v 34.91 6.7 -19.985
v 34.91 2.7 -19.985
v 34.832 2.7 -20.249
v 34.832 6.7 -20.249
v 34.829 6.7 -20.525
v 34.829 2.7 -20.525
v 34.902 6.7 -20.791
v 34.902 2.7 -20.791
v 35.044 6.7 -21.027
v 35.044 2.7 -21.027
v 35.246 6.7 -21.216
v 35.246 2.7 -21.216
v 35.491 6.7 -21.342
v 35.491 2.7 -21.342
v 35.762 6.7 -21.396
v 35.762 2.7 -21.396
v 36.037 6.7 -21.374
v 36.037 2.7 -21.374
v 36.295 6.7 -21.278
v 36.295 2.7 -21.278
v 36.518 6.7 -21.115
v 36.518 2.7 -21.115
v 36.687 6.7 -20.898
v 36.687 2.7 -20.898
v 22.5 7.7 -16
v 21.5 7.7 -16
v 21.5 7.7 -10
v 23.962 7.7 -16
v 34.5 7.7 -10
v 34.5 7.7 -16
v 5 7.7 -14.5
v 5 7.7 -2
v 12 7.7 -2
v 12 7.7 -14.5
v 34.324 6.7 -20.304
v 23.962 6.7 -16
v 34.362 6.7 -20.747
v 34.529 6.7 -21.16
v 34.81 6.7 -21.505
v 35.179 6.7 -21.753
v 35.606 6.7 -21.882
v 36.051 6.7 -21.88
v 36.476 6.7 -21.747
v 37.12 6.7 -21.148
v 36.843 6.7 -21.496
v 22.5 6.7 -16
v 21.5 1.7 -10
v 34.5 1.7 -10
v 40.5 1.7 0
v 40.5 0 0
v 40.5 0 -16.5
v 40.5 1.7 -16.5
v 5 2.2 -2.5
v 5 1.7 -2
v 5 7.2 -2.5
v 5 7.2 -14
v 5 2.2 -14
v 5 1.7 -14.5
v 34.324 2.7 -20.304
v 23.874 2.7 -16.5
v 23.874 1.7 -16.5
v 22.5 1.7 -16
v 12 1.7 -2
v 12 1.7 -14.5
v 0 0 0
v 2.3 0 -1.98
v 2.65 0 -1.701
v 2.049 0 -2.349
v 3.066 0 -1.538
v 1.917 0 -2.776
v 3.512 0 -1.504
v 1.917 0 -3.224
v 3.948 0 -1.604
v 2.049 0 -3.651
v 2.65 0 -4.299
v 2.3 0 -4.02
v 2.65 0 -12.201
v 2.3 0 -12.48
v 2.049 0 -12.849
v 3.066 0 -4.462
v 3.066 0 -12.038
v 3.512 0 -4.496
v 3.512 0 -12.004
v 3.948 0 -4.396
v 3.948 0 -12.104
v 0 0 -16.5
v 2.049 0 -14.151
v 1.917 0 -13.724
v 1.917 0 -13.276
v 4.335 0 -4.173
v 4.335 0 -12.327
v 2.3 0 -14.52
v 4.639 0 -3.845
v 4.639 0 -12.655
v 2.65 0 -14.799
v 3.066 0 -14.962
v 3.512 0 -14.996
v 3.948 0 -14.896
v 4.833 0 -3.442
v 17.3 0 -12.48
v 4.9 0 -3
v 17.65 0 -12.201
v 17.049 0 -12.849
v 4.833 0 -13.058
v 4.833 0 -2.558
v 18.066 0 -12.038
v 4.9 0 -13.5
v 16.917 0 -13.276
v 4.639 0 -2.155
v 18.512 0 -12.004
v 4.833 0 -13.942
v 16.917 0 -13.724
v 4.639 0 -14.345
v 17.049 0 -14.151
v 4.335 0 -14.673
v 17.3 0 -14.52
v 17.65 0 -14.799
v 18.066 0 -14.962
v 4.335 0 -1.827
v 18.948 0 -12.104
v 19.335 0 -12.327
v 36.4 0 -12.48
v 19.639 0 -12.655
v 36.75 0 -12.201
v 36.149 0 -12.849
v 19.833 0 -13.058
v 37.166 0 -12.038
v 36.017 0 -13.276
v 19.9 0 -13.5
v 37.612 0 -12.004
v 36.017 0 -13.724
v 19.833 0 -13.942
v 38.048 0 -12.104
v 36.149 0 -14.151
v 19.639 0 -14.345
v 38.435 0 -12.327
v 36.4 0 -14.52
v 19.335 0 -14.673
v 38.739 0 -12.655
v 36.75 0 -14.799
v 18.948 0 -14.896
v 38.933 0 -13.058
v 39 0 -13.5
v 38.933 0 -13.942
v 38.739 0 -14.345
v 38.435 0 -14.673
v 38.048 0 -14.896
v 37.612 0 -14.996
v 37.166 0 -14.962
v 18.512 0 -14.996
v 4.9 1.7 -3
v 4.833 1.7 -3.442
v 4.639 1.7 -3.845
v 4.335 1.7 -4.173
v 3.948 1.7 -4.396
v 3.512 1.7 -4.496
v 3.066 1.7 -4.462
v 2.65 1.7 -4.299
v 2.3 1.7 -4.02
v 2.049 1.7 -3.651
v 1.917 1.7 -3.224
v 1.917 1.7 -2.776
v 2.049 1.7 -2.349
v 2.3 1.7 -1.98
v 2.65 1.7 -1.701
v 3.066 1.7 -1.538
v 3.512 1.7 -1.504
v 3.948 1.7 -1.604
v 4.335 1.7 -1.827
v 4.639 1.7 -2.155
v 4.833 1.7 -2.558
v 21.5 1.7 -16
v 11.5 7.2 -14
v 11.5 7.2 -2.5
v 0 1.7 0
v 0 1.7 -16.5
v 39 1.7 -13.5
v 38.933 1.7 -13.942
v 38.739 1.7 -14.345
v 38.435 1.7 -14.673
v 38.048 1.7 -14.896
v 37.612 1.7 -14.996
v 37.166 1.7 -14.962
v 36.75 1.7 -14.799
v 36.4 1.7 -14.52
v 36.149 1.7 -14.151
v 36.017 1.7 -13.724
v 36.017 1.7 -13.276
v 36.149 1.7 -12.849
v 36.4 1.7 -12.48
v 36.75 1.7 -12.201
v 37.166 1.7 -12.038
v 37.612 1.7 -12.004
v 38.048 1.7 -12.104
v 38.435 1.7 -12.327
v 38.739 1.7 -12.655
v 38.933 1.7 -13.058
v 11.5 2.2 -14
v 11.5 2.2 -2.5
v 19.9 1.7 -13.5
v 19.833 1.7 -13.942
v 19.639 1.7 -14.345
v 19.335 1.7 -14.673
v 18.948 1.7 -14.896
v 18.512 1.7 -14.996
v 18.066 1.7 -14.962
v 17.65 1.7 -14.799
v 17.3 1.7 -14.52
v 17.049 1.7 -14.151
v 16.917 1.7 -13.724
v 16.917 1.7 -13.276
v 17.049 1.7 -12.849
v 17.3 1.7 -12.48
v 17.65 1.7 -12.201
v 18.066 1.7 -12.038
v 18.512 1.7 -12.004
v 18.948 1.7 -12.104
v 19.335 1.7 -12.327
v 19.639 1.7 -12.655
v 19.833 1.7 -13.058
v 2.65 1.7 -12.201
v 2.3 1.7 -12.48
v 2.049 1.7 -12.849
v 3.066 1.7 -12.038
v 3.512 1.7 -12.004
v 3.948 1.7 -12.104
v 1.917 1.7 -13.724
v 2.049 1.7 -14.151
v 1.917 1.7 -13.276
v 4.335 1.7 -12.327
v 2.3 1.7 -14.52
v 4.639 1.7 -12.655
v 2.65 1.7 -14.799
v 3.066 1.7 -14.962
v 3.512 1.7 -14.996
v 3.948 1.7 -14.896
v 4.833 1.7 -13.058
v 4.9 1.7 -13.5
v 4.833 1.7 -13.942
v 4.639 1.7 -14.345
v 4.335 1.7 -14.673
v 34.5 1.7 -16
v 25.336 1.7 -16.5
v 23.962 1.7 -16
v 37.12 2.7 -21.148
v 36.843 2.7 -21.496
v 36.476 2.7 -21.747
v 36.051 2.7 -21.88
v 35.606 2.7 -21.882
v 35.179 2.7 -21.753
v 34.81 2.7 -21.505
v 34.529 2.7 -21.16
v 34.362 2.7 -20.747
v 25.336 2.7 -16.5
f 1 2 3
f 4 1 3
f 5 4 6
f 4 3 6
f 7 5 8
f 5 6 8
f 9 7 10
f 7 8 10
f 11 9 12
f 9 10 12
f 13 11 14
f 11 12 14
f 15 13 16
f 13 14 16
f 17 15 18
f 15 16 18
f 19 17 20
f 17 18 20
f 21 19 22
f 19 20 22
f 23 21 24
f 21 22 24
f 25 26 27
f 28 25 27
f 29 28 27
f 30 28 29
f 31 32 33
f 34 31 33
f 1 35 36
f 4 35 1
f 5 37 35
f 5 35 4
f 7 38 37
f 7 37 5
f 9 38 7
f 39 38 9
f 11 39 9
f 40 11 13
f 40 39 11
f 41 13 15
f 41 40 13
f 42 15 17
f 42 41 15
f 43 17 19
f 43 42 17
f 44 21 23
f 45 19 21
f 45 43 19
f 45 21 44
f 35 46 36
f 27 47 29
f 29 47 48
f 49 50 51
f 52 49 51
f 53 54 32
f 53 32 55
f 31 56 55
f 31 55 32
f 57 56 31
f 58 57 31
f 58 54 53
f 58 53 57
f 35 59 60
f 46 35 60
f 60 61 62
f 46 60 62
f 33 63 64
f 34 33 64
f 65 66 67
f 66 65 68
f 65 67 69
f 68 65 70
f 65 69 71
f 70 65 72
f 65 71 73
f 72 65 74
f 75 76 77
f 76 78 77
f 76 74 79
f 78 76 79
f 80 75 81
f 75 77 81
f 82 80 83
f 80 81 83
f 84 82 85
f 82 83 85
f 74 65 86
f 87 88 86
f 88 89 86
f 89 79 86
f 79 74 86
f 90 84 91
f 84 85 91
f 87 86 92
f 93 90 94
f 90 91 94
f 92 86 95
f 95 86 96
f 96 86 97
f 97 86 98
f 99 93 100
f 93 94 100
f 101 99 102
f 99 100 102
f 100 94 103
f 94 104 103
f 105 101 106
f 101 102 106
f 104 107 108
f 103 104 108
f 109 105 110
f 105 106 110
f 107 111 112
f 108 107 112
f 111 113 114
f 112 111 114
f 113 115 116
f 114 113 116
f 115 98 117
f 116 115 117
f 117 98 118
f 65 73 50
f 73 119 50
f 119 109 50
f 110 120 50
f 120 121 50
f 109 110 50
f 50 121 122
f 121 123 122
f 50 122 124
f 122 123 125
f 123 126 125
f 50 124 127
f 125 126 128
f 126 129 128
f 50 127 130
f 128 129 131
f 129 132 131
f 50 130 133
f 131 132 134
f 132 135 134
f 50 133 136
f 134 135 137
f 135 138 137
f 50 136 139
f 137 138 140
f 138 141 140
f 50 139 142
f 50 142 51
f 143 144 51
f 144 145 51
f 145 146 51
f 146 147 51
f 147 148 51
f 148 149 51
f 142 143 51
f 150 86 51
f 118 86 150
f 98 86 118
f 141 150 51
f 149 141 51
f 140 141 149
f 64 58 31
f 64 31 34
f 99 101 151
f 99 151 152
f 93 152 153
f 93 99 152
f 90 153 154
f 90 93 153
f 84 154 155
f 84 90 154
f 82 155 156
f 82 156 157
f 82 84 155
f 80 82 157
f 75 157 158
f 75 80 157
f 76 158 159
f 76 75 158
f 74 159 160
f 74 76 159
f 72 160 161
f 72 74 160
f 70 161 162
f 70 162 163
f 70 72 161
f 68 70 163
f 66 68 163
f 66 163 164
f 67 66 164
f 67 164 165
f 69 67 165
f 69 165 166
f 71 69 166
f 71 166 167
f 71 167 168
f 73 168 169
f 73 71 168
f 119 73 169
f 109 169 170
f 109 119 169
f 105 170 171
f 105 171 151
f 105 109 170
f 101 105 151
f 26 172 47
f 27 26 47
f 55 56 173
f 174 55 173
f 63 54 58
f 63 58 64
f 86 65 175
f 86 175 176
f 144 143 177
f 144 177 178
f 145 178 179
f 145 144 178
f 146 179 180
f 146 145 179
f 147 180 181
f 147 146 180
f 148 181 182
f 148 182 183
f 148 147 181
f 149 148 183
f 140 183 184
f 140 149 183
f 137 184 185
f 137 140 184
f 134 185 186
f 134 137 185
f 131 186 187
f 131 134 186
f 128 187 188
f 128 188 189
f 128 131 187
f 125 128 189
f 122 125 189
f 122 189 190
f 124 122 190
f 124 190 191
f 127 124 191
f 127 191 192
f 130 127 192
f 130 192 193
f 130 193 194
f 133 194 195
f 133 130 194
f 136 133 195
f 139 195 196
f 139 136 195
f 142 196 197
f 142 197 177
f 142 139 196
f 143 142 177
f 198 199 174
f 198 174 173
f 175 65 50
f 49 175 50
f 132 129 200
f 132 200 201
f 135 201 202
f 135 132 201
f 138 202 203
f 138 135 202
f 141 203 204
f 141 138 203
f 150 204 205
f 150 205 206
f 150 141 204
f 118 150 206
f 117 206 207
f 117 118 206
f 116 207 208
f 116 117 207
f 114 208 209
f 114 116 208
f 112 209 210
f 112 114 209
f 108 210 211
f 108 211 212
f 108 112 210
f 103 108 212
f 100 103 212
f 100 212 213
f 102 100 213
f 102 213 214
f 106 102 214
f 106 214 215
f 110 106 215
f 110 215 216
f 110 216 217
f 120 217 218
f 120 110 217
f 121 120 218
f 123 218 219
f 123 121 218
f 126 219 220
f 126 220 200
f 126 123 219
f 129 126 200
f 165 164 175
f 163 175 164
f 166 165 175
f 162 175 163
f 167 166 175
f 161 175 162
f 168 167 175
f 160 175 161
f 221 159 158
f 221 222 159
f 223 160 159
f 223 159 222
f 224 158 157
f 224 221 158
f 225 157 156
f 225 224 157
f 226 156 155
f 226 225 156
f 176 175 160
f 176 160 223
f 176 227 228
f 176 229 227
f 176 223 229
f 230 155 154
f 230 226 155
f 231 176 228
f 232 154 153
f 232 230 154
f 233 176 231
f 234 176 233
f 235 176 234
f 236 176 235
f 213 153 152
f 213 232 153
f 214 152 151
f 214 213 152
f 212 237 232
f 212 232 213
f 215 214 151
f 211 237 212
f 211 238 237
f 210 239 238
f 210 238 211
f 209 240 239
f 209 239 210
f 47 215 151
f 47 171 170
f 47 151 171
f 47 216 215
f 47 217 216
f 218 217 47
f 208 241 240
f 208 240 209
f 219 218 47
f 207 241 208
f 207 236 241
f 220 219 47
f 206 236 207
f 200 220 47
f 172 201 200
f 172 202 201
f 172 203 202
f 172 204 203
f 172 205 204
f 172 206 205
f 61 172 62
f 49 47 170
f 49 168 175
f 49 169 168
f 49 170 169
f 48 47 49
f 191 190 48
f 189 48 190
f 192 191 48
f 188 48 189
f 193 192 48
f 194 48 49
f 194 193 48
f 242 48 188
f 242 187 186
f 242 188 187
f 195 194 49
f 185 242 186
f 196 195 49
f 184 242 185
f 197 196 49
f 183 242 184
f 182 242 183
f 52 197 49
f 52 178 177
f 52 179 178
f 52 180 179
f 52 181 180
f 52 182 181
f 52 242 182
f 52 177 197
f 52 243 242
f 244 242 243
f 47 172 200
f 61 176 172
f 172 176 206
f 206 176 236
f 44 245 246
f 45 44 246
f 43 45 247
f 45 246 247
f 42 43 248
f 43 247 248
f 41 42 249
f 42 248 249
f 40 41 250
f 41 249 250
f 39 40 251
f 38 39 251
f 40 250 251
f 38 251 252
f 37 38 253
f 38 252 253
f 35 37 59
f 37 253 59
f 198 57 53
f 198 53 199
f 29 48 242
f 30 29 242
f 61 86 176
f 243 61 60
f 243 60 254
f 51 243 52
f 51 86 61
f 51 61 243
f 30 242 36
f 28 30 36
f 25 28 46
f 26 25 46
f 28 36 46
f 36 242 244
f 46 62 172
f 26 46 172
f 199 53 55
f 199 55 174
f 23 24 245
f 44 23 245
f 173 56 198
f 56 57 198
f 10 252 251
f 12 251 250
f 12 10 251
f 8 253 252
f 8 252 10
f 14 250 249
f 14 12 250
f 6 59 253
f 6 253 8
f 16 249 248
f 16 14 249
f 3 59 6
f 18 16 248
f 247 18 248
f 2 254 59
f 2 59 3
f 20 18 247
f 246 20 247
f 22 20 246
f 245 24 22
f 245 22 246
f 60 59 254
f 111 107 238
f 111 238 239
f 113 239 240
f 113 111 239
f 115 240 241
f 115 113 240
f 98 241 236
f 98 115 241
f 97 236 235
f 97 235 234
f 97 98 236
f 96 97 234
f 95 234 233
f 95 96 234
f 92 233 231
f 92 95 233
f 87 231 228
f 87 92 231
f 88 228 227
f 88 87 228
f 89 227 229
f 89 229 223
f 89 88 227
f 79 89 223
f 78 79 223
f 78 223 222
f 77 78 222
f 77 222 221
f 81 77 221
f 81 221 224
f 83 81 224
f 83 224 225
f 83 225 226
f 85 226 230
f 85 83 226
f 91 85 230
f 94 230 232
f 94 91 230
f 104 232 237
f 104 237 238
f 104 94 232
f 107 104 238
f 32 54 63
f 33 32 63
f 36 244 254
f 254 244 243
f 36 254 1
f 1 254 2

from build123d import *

# Parameters (mm, degrees)
SKETCH1_W           = 40.5
SKETCH1_H           = 16.5
SKETCH1_R           = 1.5
BOSS_EXTRUDE1_DEPTH = 1.7
SKETCH2_W           = 7
SKETCH2_H           = 12.5
BOSS_EXTRUDE2_DEPTH = 6
SHELL1_T            = -0.5
BOSS_EXTRUDE3_DEPTH = 6
SKETCH4_W           = 14.620237932
SKETCH4_H           = 5.897683247
CUT_EXTRUDE1_DEPTH  = 1
SKETCH5_W           = 13.246499222
SKETCH5_H           = 5.397683247
CUT_EXTRUDE2_DEPTH  = 1


with BuildPart() as part:
    # Sketch1 → Boss-Extrude1 (new body)
    with BuildSketch(Plane(origin=(0, 0, 0), x_dir=(1, 0, 0), z_dir=(0, 1, 0))):
        with Locations((20.25, 8.25)):
            Rectangle(SKETCH1_W, SKETCH1_H)
        with Locations((3.4, 3)):
            Circle(SKETCH1_R, mode=Mode.SUBTRACT)
        with Locations((3.4, 13.5)):
            Circle(SKETCH1_R, mode=Mode.SUBTRACT)
        with Locations((18.4, 13.5)):
            Circle(SKETCH1_R, mode=Mode.SUBTRACT)
        with Locations((37.5, 13.5)):
            Circle(SKETCH1_R, mode=Mode.SUBTRACT)
    extrude(amount=BOSS_EXTRUDE1_DEPTH)

    # Sketch3 → Boss-Extrude3 (add)
    with BuildSketch(Plane(origin=(0, 1.7, 0), x_dir=(1, 0, 0), z_dir=(0, 1, 0))):
        with BuildLine():
            Line((21.5, 16), (21.5, 10))
            Line((21.5, 10), (34.5, 10))
            Line((34.5, 10), (34.5, 16))
            Line((34.5, 16), (23.9619022, 16))
            Line((23.9619022, 16), (34.910364087, 19.984914238))
            ThreePointArc((34.910364087, 19.984914238), (35.364265687, 21.287183777), (36.68722523, 20.897683247))
            Line((36.68722523, 20.897683247), (37.120237932, 21.147683247))
            ThreePointArc((37.120237932, 21.147683247), (35.387719987, 21.833682979), (34.324150839, 20.303638951))
            Line((34.324150839, 20.303638951), (22.5, 16))
            Line((22.5, 16), (21.5, 16))
        make_face()
    extrude(amount=BOSS_EXTRUDE3_DEPTH)

    # Sketch4 → Cut-Extrude1 (cut)
    with BuildSketch(Plane(origin=(0, 7.7, 0), x_dir=(1, 0, 0), z_dir=(0, 1, 0))):
        with Locations((29.810118966, 18.948841624)):
            Rectangle(SKETCH4_W, SKETCH4_H)
    extrude(amount=-CUT_EXTRUDE1_DEPTH, mode=Mode.SUBTRACT)

    # Sketch5 → Cut-Extrude2 (cut)
    with BuildSketch(Plane.XZ.offset(-1.7)):
        with Locations((30.496988321, -19.198841624)):
            Rectangle(SKETCH5_W, SKETCH5_H)
    extrude(amount=-CUT_EXTRUDE2_DEPTH, mode=Mode.SUBTRACT)


with BuildPart() as body_2:
    # Sketch2 → Boss-Extrude2 (new body)
    with BuildSketch(Plane(origin=(0, 1.7, 0), x_dir=(1, 0, 0), z_dir=(0, 1, 0))):
        with Locations((8.5, 8.25)):
            Rectangle(SKETCH2_W, SKETCH2_H)
    extrude(amount=BOSS_EXTRUDE2_DEPTH)

    # Shell1
    shell1_openings = [body_2.faces().sort_by_distance(p)[0] for p in [
        (5, 4.7, -8.25),
    ]]
    offset(amount=SHELL1_T, openings=shell1_openings, kind=Kind.INTERSECTION)


solid = Compound([part.part, body_2.part])
